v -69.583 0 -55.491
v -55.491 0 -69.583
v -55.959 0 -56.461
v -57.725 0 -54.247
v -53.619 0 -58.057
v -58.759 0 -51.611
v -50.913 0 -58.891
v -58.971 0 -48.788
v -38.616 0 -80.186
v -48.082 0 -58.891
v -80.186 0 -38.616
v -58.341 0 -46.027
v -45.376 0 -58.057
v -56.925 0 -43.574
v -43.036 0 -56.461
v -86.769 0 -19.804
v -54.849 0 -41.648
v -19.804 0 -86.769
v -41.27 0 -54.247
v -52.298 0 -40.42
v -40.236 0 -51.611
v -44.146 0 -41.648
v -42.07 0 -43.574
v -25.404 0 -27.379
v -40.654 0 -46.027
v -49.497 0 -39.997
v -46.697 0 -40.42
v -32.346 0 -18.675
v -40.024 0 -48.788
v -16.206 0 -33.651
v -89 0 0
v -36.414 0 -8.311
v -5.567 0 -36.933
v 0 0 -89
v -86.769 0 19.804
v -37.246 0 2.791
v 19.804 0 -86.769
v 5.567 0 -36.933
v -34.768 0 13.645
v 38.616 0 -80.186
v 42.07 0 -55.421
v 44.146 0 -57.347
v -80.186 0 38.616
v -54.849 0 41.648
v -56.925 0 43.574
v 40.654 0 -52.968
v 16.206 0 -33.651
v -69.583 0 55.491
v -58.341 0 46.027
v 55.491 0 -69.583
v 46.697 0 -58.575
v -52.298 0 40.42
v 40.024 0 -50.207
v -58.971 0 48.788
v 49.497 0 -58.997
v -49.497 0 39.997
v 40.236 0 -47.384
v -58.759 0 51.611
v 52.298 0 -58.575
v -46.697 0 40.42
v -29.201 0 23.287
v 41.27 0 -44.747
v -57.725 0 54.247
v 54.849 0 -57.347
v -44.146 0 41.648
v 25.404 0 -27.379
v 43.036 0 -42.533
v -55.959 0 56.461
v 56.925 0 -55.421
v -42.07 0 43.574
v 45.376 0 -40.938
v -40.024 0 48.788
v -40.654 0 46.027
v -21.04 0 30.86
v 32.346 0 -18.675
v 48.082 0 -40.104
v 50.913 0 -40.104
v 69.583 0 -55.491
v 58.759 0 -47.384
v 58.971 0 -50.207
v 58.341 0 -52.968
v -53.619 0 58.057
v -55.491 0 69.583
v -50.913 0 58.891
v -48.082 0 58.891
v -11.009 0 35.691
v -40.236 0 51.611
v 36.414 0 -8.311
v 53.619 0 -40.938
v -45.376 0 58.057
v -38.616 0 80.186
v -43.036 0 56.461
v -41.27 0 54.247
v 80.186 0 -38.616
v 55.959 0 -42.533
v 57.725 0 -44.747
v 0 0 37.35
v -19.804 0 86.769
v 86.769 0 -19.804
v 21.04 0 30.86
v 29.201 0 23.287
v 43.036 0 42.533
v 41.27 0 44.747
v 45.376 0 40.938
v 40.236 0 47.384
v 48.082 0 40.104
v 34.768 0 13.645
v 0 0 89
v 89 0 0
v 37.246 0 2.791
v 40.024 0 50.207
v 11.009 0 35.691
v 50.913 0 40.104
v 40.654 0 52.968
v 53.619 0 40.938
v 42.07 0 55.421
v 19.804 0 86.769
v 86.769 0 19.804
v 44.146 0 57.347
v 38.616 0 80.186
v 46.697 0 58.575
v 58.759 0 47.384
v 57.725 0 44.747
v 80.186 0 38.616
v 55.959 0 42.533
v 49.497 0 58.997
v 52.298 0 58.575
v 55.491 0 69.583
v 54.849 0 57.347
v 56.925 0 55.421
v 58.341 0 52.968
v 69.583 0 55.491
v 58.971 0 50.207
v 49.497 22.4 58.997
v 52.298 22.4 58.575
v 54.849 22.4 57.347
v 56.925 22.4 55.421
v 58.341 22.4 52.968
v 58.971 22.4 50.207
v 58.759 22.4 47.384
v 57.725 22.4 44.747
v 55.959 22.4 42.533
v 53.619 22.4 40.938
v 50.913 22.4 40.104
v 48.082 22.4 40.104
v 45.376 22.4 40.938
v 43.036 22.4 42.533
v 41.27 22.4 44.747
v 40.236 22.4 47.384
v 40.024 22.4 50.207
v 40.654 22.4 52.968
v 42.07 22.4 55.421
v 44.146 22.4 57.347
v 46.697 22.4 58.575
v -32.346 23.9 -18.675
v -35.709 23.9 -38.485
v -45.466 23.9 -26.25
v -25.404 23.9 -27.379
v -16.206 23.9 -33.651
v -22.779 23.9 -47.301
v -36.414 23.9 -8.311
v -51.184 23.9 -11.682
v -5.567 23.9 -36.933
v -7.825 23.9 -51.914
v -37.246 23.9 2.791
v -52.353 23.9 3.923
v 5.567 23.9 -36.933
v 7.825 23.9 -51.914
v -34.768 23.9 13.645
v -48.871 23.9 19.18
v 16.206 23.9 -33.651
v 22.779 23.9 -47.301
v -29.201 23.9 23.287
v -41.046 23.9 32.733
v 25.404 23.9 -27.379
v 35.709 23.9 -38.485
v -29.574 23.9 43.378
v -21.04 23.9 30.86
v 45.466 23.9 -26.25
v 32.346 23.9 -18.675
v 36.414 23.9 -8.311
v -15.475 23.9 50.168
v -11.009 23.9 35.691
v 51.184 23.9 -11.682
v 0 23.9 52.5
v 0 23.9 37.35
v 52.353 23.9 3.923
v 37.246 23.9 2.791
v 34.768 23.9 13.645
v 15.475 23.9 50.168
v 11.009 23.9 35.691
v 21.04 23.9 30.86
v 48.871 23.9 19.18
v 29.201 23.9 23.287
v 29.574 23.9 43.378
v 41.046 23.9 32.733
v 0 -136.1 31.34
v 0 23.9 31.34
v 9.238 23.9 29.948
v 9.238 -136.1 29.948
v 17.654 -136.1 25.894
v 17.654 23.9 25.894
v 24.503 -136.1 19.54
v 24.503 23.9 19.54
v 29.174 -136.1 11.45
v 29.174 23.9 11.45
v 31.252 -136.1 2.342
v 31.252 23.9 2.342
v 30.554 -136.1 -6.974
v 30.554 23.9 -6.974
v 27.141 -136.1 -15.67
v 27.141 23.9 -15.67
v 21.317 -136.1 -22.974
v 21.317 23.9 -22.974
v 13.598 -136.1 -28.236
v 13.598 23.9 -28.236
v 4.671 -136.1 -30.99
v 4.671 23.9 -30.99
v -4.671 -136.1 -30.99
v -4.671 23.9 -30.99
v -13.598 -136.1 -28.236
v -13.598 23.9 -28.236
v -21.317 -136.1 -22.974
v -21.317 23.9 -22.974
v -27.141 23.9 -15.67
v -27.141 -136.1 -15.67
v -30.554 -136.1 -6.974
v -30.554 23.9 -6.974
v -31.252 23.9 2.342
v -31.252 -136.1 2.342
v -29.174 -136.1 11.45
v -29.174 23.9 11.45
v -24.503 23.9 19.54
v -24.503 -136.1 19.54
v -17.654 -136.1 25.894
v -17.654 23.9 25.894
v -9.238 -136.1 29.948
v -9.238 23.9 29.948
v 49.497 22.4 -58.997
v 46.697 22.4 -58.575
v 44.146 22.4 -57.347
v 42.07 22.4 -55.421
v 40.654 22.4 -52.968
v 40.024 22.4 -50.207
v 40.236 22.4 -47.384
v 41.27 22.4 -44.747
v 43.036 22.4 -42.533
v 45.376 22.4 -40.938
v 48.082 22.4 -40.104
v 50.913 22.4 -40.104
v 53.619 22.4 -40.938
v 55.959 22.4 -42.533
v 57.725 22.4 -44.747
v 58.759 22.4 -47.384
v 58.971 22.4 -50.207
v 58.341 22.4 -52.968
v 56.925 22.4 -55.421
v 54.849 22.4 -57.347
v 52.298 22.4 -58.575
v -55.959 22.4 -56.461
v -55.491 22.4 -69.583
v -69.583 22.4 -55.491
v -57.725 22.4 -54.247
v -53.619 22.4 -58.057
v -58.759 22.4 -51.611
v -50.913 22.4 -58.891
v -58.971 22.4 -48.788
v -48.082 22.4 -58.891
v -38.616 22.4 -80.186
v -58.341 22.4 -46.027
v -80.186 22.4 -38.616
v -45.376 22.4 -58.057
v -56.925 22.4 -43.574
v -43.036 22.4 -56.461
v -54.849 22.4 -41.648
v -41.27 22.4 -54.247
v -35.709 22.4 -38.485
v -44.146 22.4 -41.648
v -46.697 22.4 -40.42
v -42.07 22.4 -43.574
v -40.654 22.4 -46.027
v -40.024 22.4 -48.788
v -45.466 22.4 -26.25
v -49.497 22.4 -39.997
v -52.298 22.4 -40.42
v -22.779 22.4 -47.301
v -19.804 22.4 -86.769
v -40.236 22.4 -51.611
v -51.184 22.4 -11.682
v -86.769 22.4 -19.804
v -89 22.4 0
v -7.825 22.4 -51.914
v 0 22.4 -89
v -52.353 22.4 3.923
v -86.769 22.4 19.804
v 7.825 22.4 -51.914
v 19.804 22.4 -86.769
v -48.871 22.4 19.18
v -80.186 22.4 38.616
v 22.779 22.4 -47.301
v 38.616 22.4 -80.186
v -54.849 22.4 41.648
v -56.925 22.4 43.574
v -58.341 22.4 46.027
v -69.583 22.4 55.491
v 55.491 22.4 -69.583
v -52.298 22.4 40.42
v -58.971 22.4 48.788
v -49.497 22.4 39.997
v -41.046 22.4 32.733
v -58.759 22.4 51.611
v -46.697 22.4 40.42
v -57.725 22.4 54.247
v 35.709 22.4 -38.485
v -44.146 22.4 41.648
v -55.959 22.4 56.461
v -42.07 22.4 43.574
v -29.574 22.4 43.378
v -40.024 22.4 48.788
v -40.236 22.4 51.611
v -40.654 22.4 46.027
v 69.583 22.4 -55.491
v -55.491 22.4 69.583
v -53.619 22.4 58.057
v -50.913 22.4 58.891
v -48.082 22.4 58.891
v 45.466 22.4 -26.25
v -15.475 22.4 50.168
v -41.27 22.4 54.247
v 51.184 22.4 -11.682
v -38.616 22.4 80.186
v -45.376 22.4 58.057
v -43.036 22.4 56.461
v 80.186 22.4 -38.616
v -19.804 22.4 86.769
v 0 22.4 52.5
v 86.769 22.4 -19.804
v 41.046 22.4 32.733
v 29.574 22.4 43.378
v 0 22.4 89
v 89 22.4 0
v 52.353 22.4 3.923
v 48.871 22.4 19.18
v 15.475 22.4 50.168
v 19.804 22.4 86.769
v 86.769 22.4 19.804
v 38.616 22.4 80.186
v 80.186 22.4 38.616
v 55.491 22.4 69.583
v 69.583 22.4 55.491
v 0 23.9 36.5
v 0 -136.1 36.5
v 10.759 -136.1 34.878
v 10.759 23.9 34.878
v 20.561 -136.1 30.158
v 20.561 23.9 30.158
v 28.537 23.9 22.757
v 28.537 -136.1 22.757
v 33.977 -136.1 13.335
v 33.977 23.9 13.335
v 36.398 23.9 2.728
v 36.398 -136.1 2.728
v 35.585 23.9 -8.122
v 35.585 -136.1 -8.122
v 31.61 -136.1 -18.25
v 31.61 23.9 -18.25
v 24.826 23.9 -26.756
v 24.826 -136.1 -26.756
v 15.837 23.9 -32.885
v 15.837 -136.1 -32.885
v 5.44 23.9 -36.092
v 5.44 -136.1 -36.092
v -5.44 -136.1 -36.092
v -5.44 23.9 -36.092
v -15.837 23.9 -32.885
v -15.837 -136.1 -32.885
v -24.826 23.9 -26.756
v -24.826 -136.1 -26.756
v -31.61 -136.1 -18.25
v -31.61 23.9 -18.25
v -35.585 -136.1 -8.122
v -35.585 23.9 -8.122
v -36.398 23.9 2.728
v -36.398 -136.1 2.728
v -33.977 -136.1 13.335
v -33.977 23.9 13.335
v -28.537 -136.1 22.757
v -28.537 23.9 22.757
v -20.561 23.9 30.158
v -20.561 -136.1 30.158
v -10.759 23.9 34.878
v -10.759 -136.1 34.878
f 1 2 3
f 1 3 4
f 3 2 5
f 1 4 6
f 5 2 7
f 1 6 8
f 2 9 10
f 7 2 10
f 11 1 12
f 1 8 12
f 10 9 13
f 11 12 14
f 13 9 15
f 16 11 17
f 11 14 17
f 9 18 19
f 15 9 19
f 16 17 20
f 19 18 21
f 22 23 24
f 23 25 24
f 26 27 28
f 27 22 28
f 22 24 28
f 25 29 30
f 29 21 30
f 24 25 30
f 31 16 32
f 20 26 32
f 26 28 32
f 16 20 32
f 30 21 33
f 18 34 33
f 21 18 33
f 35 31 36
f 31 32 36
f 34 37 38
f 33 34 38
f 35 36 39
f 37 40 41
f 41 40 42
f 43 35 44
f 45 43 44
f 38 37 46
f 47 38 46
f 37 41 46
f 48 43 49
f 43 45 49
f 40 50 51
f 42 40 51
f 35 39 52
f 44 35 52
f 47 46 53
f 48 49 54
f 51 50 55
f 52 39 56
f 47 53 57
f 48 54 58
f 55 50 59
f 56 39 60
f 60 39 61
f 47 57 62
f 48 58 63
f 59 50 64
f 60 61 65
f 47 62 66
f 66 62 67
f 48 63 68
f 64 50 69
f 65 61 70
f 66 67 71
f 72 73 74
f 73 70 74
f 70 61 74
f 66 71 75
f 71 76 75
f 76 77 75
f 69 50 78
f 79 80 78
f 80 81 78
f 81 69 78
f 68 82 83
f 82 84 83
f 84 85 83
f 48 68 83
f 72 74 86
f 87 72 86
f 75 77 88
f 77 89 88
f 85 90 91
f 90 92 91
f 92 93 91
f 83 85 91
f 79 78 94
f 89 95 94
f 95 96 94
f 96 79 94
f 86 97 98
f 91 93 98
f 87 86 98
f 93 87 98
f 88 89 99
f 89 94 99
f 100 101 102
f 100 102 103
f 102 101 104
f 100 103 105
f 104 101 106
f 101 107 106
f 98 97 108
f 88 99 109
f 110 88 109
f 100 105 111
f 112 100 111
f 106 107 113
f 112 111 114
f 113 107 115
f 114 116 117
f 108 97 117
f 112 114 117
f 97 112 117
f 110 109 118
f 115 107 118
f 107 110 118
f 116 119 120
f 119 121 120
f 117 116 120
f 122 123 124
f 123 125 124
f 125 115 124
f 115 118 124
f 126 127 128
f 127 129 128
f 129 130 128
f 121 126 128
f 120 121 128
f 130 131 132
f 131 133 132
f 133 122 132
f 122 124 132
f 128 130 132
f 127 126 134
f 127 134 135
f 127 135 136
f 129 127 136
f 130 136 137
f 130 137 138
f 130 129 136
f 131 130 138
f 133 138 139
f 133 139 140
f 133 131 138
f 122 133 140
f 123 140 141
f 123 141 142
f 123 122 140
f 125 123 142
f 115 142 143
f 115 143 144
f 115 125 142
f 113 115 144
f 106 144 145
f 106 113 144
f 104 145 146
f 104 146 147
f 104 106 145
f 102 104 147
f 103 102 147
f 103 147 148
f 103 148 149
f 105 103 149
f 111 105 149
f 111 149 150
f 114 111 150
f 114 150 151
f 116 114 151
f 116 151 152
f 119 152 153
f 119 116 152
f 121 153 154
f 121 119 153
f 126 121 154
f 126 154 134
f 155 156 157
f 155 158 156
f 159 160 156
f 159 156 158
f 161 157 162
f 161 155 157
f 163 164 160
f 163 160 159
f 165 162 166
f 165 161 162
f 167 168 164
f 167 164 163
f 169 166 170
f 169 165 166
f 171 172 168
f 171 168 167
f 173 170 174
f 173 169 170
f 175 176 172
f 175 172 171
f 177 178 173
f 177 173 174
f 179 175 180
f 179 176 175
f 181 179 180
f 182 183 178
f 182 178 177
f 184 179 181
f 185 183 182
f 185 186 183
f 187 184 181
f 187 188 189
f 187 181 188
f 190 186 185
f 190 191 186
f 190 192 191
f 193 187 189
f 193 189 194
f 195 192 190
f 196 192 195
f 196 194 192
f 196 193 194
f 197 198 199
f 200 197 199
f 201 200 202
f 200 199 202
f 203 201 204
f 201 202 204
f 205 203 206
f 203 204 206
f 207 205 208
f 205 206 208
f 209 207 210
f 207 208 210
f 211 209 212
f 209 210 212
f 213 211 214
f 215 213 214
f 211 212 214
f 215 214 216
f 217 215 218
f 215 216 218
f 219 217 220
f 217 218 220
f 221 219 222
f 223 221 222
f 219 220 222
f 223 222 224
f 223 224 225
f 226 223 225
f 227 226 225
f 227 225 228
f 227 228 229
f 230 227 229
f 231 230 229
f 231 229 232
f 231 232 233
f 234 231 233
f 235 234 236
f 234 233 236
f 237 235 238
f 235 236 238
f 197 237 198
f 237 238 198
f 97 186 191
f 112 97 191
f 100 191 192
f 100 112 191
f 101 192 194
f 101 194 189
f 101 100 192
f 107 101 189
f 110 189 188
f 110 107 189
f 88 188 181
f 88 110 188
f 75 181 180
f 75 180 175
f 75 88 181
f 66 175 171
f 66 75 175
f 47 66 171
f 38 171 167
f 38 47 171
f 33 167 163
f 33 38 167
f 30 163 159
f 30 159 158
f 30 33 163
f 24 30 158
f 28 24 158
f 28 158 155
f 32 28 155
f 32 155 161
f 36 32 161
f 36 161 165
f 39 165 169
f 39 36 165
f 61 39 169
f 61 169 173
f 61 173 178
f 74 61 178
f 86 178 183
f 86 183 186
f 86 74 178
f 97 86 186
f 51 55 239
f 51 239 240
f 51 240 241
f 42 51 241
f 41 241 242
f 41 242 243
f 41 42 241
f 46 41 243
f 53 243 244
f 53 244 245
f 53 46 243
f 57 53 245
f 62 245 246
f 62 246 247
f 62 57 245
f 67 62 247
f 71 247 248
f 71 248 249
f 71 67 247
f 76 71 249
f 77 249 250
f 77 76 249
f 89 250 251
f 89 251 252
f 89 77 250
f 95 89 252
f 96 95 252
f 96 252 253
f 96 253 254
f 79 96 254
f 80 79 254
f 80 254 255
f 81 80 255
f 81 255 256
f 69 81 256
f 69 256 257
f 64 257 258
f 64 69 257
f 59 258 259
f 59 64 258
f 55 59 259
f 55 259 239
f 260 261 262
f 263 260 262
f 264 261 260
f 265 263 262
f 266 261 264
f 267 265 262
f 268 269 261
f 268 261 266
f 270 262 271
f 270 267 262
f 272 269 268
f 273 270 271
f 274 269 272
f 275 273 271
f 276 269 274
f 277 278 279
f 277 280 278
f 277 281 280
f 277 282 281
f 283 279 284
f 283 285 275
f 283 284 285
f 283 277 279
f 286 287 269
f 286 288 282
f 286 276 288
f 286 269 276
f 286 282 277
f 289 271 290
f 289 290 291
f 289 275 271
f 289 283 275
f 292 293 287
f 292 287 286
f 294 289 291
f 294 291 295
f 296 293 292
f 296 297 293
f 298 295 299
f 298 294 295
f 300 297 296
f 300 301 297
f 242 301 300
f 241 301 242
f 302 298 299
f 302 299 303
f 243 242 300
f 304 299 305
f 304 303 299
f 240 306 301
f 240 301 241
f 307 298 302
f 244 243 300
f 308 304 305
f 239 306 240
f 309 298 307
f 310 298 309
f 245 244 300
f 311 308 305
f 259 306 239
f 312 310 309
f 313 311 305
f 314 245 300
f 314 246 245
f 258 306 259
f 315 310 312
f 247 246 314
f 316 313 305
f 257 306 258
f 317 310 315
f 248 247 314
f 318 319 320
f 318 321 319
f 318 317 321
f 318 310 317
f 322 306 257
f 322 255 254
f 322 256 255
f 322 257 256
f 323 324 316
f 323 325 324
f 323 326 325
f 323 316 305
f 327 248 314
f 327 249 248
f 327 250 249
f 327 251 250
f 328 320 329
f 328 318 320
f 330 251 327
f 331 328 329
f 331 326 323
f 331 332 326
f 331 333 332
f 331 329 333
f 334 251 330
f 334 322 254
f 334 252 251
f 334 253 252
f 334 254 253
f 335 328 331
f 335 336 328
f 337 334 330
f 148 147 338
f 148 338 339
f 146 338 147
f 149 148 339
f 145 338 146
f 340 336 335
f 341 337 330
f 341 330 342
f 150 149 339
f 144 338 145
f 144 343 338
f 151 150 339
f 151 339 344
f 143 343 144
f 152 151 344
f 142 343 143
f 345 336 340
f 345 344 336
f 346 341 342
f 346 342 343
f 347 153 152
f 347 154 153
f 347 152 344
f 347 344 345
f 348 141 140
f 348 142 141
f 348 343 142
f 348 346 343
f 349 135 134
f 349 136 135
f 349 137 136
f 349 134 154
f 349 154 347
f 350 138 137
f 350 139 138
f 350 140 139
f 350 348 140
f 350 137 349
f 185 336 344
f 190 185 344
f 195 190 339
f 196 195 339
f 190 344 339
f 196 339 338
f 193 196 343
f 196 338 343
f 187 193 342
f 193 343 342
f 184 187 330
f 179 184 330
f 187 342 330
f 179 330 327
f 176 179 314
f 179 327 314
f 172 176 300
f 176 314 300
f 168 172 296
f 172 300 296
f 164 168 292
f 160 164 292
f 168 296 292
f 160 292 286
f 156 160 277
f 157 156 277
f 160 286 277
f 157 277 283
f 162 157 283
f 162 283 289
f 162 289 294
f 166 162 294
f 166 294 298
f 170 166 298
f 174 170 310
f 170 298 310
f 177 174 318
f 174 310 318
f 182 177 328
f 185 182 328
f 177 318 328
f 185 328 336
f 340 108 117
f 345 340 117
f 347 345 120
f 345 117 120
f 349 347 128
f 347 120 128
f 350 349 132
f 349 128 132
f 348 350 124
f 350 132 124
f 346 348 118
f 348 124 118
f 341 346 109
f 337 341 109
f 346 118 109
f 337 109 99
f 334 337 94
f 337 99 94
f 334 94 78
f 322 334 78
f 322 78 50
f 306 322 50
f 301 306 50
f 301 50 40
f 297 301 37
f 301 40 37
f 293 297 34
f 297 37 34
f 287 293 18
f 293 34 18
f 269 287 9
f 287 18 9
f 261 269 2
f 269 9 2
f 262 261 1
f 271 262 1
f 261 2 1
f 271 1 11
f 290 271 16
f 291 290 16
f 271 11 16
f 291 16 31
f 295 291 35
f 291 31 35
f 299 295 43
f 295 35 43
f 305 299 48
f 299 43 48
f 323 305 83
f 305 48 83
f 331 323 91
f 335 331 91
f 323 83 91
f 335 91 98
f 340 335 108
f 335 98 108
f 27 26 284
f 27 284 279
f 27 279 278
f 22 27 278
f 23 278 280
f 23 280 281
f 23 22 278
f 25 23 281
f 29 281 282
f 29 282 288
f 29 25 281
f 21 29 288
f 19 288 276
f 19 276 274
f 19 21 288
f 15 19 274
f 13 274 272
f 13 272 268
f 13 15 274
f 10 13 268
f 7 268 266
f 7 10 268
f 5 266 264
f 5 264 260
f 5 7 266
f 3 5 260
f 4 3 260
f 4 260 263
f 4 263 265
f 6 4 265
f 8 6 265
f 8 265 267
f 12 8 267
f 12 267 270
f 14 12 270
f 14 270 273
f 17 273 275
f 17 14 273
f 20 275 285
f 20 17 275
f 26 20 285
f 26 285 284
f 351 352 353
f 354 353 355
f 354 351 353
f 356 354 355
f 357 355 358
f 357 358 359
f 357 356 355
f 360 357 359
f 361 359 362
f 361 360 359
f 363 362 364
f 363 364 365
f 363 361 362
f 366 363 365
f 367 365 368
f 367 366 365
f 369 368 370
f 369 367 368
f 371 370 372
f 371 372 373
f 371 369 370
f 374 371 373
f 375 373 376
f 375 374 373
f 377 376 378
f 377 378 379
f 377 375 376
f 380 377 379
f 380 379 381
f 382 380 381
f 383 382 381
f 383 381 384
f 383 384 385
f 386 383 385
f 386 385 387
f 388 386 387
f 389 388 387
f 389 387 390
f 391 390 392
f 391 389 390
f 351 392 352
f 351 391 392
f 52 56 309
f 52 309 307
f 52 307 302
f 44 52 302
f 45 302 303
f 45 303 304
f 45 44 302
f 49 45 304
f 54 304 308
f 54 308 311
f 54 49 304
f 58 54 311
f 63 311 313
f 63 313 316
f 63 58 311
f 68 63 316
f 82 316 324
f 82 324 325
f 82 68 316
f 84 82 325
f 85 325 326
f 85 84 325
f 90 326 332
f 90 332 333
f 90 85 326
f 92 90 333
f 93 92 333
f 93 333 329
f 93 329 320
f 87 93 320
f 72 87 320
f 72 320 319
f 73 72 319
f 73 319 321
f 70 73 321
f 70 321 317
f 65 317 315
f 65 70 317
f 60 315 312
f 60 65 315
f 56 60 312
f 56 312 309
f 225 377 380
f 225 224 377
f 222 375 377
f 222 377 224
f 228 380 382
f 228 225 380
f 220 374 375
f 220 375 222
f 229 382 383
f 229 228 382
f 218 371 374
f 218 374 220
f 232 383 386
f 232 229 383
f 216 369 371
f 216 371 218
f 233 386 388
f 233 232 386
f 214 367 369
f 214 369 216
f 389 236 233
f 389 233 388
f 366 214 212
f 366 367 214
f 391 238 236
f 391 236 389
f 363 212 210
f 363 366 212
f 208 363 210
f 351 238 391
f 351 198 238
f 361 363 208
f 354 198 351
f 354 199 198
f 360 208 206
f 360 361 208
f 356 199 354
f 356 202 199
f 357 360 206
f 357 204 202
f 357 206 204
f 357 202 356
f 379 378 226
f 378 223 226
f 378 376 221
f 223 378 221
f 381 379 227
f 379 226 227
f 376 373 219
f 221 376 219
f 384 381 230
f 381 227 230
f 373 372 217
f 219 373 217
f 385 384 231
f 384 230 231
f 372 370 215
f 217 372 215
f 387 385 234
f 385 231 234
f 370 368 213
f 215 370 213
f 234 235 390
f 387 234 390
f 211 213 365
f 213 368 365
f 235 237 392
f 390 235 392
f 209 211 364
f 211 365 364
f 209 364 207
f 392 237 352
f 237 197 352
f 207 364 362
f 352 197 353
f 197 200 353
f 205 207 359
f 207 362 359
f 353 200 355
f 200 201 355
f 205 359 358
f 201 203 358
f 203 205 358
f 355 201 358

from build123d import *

# Parameters (mm, degrees)
SKETCH1_R           = 89
SKETCH1_R_2         = 37.35
SKETCH1_R_3         = 9.5
BOSS_EXTRUDE1_DEPTH = 22.4
SKETCH2_R           = 52.5
SKETCH2_R_2         = 37.35
BOSS_EXTRUDE2_DEPTH = 1.5
SKETCH3_R           = 36.5
SKETCH3_R_2         = 31.34
BOSS_EXTRUDE3_DEPTH = 160


with BuildPart() as part:
    # Sketch1 → Boss-Extrude1 (new body)
    with BuildSketch(Plane(origin=(0, 0, 0), x_dir=(1, 0, 0), z_dir=(0, 1, 0))):
        Circle(SKETCH1_R)
        Circle(SKETCH1_R_2, mode=Mode.SUBTRACT)
        with Locations((-49.497474683, 49.497474683)):
            Circle(SKETCH1_R_3, mode=Mode.SUBTRACT)
        with Locations((-49.497474683, -49.497474683)):
            Circle(SKETCH1_R_3, mode=Mode.SUBTRACT)
        with Locations((49.497474683, -49.497474683)):
            Circle(SKETCH1_R_3, mode=Mode.SUBTRACT)
        with Locations((49.497474683, 49.497474683)):
            Circle(SKETCH1_R_3, mode=Mode.SUBTRACT)
    extrude(amount=BOSS_EXTRUDE1_DEPTH)

    # Sketch2 → Boss-Extrude2 (add)
    with BuildSketch(Plane(origin=(0, 22.4, 0), x_dir=(1, 0, 0), z_dir=(0, 1, 0))):
        Circle(SKETCH2_R)
        Circle(SKETCH2_R_2, mode=Mode.SUBTRACT)
    extrude(amount=BOSS_EXTRUDE2_DEPTH)


with BuildPart() as body_2:
    # Sketch3 → Boss-Extrude3 (new body)
    with BuildSketch(Plane(origin=(0, 23.9, 0), x_dir=(1, 0, 0), z_dir=(0, 1, 0))):
        Circle(SKETCH3_R)
        Circle(SKETCH3_R_2, mode=Mode.SUBTRACT)
    extrude(amount=-BOSS_EXTRUDE3_DEPTH)


solid = Compound([part.part, body_2.part])
